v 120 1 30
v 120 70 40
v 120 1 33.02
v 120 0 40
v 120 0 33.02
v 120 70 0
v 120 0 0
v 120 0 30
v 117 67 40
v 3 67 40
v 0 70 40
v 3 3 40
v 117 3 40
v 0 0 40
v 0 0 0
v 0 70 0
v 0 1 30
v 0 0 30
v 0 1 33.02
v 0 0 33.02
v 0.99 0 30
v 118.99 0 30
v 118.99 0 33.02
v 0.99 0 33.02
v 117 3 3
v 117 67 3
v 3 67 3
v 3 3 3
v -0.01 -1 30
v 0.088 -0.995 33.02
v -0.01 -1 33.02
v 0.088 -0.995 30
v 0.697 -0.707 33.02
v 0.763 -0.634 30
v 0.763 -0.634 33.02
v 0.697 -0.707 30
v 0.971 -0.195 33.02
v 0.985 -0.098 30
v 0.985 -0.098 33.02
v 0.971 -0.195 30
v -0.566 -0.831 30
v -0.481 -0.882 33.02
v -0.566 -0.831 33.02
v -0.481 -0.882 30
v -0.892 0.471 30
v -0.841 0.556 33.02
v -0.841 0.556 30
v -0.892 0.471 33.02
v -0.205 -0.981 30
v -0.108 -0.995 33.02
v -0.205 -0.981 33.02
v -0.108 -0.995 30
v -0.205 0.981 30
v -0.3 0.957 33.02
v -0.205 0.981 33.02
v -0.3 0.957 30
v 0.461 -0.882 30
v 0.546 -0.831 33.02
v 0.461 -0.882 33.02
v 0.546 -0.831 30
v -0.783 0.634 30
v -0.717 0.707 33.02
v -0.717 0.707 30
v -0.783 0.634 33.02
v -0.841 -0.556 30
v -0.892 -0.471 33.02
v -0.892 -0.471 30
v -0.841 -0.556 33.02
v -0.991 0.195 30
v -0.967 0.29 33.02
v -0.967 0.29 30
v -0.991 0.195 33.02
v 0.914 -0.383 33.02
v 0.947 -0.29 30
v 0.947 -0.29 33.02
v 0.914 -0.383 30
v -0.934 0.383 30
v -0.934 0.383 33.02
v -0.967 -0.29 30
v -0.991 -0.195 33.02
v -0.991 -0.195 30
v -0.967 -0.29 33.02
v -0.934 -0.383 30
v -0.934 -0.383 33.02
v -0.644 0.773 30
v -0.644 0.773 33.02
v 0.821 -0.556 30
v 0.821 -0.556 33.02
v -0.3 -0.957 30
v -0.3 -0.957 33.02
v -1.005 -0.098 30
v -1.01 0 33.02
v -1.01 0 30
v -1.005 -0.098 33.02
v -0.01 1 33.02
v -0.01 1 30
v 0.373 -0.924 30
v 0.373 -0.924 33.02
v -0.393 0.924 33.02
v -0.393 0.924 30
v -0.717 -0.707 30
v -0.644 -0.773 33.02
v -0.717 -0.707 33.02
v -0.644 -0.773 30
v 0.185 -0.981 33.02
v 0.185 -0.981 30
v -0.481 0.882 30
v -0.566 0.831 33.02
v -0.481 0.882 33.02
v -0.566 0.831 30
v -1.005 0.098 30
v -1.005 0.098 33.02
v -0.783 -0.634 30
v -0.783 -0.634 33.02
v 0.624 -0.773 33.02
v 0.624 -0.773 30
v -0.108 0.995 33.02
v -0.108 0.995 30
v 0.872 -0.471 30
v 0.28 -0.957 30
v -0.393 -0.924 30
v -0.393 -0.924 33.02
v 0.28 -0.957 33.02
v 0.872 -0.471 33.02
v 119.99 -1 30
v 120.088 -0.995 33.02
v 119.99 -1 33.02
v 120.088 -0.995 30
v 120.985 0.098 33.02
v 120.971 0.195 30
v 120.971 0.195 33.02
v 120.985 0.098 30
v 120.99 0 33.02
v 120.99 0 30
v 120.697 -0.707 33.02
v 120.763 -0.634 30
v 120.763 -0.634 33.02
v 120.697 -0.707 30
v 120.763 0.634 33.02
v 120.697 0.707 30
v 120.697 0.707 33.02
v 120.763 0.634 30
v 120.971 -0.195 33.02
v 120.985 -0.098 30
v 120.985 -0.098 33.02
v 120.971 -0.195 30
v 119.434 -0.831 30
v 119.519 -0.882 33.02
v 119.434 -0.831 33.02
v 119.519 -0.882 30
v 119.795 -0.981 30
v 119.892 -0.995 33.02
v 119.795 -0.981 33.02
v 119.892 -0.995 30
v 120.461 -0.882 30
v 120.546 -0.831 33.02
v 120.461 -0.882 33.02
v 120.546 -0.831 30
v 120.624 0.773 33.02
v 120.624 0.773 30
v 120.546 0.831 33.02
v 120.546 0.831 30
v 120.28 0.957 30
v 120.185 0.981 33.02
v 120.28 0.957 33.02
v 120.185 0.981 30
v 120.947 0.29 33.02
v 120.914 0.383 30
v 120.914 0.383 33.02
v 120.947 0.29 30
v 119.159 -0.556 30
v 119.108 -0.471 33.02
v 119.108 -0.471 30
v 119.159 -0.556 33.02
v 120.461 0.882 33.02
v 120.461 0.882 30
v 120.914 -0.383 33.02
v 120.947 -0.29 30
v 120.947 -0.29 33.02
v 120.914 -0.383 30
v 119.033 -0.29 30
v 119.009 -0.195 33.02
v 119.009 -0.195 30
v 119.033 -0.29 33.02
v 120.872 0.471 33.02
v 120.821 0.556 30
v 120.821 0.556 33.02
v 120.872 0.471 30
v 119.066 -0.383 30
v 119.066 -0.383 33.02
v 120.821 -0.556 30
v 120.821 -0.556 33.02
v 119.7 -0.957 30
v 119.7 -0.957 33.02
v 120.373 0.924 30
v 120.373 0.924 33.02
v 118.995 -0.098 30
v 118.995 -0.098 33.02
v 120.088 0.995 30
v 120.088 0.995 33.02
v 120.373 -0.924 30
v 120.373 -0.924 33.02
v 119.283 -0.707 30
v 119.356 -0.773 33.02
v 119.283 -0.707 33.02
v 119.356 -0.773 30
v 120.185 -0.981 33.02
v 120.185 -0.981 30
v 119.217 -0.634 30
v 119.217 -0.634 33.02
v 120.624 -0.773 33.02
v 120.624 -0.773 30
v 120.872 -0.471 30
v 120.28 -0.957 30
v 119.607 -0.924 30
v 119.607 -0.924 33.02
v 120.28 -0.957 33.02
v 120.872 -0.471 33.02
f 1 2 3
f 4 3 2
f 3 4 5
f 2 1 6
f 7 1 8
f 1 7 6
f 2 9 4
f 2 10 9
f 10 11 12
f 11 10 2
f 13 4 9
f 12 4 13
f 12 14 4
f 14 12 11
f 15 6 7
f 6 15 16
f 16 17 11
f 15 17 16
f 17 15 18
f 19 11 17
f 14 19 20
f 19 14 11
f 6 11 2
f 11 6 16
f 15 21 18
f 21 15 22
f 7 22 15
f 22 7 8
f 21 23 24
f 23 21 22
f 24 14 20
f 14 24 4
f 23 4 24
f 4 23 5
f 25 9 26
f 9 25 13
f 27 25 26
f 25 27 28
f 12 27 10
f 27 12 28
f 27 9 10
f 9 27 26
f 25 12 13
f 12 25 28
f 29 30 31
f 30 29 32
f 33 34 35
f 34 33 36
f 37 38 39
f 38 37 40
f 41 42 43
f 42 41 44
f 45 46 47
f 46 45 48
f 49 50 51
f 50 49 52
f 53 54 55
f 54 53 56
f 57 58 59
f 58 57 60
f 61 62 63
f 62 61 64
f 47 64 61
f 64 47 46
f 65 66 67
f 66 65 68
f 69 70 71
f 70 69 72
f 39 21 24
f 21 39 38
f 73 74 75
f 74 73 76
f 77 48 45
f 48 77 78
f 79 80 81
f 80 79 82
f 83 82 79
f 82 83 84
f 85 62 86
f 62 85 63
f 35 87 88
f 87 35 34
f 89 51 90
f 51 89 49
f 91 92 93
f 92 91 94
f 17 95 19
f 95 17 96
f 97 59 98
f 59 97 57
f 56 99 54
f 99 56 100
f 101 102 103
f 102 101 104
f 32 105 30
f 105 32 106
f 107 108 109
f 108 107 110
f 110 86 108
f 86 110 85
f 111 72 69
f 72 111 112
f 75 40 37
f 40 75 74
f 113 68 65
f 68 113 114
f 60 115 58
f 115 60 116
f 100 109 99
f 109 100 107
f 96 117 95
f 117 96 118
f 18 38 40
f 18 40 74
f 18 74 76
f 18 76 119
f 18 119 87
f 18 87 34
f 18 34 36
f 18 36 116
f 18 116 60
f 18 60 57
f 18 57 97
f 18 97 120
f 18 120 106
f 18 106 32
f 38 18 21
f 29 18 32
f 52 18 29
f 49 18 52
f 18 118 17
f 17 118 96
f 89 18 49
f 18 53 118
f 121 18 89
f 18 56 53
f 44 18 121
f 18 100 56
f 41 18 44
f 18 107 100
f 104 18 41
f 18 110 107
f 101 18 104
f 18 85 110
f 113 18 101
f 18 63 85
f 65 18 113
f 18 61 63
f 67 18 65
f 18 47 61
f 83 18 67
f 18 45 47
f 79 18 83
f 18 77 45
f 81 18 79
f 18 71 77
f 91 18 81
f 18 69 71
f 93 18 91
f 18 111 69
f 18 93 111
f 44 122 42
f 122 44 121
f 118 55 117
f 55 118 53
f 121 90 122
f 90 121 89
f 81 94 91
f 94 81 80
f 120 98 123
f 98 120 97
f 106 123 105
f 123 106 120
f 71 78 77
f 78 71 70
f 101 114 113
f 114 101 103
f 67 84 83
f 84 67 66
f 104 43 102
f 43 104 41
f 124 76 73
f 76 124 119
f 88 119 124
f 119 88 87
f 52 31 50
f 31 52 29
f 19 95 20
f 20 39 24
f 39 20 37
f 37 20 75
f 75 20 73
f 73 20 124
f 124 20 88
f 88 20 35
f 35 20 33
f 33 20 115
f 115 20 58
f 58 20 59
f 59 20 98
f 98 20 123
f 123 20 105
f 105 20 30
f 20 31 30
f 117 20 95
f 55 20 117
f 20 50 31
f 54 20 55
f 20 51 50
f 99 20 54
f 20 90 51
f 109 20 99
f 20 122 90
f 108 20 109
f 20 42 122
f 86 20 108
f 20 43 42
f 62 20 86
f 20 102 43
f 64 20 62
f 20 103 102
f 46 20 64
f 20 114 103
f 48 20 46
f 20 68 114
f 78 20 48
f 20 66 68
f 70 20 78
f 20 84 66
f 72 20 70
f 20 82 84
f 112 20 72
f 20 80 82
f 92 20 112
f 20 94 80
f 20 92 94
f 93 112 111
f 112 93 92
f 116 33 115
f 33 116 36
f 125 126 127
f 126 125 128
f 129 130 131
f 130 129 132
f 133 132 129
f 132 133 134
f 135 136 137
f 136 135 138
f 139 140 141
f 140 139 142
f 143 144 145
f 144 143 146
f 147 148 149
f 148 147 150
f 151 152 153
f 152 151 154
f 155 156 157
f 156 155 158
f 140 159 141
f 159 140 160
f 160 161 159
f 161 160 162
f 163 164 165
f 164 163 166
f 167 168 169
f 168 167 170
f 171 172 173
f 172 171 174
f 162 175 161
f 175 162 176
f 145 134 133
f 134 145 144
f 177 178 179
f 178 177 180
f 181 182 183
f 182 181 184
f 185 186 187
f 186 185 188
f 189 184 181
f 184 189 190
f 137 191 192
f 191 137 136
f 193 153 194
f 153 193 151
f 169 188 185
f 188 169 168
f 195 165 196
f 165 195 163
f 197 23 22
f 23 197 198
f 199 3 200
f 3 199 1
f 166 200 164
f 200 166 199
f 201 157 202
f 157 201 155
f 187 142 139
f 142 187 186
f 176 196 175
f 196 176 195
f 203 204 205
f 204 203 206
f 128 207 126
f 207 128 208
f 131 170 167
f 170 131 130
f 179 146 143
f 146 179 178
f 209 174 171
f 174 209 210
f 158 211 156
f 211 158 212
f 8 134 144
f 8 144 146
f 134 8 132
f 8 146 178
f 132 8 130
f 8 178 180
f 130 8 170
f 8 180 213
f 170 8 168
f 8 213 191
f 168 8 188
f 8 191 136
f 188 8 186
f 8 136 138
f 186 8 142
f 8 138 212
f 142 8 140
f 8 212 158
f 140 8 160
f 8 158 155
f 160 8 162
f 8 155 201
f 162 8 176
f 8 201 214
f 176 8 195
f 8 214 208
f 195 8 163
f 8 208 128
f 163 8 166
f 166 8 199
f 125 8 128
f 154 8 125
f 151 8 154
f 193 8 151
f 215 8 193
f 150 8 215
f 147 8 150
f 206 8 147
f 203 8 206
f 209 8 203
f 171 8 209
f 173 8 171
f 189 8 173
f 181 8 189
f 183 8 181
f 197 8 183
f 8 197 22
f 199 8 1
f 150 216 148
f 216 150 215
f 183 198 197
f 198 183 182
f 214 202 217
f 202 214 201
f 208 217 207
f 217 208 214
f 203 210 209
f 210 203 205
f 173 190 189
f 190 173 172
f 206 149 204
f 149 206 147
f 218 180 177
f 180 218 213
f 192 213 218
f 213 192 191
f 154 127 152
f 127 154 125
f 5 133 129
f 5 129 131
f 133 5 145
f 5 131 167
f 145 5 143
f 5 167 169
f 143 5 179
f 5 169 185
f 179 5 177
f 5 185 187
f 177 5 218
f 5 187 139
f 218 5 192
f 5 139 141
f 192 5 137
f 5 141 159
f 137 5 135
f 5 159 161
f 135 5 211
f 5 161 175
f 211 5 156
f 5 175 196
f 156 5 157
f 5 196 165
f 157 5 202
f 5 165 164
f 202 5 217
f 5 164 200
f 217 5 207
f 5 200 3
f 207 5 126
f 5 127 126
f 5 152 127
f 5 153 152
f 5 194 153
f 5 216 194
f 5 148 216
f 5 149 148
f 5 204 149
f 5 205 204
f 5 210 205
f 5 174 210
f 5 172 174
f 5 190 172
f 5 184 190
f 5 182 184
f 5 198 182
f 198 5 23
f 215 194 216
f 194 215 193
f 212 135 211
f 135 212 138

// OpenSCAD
// Buffer tank for mini horizontal gel-electrophoresis box
// Outer dimensions: 120 mm (X) x 70 mm (Y) x 40 mm (Z)
// Wall thickness: 3 mm, Floor thickness: 3 mm
// Platform: 60 mm long in X (centred), full inner width (Y), top at z = 13 (10 mm above inner floor)
// Electrode holes: 2 mm diameter, horizontal, at y = 0, z = 30, through each end wall

$fn = 64;

// Dimensions
outer_x = 120;
outer_y = 70;
outer_z = 40;
wall_thick = 3;
floor_thick = 3;
platform_height = 13; // z-coordinate of platform top (from base)
hole_z = 30;
hole_d = 2;

// Inner dimensions
inner_x = outer_x - 2 * wall_thick;
inner_y = outer_y - 2 * wall_thick;
inner_z = outer_z - floor_thick;

// Platform dimensions
platform_x = 60;
platform_y = inner_y;
platform_z = platform_height;

// Calculate positions
half_outer_x = outer_x / 2;
half_outer_y = outer_y / 2;

// Main tank shell
module tank_shell() {
    difference() {
        // Outer shell
        cube([outer_x, outer_y, outer_z]);
        
        // Inner cavity (removes interior)
        translate([wall_thick, wall_thick, floor_thick])
            cube([inner_x, inner_y, inner_z]);
        
        // Remove platform area from base (so platform is solid)
        // Platform is 60 mm long, centred in X
        platform_start_x = (outer_x - platform_x) / 2 - wall_thick;
        translate([wall_thick + platform_start_x, wall_thick, 0])
            cube([platform_x + 2 * wall_thick, inner_y, platform_z]);
    }
}

// Platform (solid raised platform)
module platform() {
    platform_start_x = (outer_x - platform_x) / 2;
    translate([platform_start_x, wall_thick, floor_thick])
        cube([platform_x, inner_y, platform_z]);
}

// Electrode holes
module electrode_holes() {
    // Left hole (through left wall at x = 0)
    translate([-0.01, 0, hole_z])
        cylinder(h = wall_thick + 0.02, r = hole_d / 2);
    
    // Right hole (through right wall at x = outer_x)
    translate([outer_x - 0.01, 0, hole_z])
        cylinder(h = wall_thick + 0.02, r = hole_d / 2);
}

// Build the buffer tank
module buffer_tank() {
    union() {
        // Tank shell with platform
        difference() {
            union() {
                // Main outer shell
                cube([outer_x, outer_y, outer_z]);
                
                // Platform
                platform();
            }
            
            // Remove inner cavity
            translate([wall_thick, wall_thick, floor_thick])
                cube([inner_x, inner_y, inner_z]);
            
            // Remove platform area from the base (to avoid double-counting)
            // Actually, the platform is already added separately, so we need to remove
            // the platform volume from the shell to avoid overlap
            platform_start_x = (outer_x - platform_x) / 2;
            translate([platform_start_x, wall_thick, floor_thick])
                cube([platform_x, inner_y, platform_z]);
        }
        
        // Electrode holes
        electrode_holes();
    }
}

// Final tank
buffer_tank();
